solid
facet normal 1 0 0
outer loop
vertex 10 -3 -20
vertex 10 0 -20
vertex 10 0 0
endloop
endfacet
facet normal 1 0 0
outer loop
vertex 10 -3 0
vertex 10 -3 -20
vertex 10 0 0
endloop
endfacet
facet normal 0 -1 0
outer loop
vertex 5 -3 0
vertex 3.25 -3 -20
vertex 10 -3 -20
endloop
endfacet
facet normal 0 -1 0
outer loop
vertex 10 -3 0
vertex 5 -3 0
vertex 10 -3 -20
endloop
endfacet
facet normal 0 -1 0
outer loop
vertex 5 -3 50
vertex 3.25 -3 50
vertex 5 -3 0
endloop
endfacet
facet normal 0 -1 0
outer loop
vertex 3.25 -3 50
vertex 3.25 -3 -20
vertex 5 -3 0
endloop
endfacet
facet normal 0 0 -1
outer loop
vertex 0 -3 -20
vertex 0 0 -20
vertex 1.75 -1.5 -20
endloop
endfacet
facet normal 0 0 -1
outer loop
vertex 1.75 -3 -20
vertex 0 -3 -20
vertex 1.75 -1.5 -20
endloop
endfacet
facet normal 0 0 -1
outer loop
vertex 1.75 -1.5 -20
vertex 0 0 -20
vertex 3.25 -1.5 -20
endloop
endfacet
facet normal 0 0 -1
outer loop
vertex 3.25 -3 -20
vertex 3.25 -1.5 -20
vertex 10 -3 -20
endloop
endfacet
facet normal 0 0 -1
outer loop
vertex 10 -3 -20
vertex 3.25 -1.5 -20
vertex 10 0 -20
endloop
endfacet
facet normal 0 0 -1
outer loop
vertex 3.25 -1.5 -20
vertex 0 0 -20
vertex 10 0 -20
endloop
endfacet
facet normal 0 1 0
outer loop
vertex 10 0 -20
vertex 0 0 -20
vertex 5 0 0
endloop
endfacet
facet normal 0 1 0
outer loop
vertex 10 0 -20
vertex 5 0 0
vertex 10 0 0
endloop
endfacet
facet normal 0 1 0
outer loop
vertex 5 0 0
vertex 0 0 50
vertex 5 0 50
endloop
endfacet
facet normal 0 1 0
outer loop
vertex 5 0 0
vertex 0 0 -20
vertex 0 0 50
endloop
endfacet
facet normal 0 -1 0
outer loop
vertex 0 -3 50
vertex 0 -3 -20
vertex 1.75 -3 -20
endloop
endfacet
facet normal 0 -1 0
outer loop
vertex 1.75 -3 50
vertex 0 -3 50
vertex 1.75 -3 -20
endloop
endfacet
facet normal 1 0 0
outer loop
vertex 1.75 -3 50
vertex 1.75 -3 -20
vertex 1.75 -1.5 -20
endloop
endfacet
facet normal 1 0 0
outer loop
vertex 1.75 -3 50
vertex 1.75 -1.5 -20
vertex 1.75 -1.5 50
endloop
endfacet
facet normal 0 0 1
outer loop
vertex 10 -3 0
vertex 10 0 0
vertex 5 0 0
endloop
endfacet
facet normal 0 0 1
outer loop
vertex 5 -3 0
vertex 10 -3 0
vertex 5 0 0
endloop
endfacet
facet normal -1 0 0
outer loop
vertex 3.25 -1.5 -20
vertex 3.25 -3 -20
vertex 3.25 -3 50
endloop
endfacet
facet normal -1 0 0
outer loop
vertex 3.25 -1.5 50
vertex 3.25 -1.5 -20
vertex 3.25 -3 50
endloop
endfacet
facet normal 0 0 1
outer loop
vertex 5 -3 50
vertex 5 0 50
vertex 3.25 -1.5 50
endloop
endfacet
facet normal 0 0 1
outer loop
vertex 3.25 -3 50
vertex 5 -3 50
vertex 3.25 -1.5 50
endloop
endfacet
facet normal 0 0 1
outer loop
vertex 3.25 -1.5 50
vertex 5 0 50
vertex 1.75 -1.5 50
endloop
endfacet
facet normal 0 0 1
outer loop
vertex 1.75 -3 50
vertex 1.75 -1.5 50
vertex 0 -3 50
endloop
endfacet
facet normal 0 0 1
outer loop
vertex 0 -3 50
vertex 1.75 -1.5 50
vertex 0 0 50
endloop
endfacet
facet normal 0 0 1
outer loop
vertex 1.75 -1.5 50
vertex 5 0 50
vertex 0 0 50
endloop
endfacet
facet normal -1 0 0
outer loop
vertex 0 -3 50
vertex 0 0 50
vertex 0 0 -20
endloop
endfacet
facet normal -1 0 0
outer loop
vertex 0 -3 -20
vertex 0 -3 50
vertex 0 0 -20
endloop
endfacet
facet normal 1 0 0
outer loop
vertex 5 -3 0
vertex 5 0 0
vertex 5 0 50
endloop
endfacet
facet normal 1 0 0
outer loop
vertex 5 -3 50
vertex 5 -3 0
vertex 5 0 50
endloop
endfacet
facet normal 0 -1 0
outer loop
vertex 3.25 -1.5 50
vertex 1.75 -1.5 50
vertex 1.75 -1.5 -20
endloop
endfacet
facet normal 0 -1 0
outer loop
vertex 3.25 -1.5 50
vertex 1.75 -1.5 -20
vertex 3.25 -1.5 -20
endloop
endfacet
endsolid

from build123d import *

# Parameters (mm, degrees)
F1_DEPTH = 3
F2_W     = 1.5
F2_H     = 70
F3_DEPTH = 1.5


with BuildPart() as f1:
    # F0 (on Front) → F1 (new body)
    with BuildSketch(Plane.XZ):
        Polygon((10, 0), (5, 0), (5, 50), (0, 50), (0, 0), (0, -20), (10, -20), align=None)
    extrude(amount=F1_DEPTH)

    # F2 (on face) → F3 (cut)
    with BuildSketch(Plane.XZ.offset(3)):
        with Locations((2.5, 15)):
            Rectangle(F2_W, F2_H)
    extrude(amount=-F3_DEPTH, mode=Mode.SUBTRACT)


solid = f1.part
